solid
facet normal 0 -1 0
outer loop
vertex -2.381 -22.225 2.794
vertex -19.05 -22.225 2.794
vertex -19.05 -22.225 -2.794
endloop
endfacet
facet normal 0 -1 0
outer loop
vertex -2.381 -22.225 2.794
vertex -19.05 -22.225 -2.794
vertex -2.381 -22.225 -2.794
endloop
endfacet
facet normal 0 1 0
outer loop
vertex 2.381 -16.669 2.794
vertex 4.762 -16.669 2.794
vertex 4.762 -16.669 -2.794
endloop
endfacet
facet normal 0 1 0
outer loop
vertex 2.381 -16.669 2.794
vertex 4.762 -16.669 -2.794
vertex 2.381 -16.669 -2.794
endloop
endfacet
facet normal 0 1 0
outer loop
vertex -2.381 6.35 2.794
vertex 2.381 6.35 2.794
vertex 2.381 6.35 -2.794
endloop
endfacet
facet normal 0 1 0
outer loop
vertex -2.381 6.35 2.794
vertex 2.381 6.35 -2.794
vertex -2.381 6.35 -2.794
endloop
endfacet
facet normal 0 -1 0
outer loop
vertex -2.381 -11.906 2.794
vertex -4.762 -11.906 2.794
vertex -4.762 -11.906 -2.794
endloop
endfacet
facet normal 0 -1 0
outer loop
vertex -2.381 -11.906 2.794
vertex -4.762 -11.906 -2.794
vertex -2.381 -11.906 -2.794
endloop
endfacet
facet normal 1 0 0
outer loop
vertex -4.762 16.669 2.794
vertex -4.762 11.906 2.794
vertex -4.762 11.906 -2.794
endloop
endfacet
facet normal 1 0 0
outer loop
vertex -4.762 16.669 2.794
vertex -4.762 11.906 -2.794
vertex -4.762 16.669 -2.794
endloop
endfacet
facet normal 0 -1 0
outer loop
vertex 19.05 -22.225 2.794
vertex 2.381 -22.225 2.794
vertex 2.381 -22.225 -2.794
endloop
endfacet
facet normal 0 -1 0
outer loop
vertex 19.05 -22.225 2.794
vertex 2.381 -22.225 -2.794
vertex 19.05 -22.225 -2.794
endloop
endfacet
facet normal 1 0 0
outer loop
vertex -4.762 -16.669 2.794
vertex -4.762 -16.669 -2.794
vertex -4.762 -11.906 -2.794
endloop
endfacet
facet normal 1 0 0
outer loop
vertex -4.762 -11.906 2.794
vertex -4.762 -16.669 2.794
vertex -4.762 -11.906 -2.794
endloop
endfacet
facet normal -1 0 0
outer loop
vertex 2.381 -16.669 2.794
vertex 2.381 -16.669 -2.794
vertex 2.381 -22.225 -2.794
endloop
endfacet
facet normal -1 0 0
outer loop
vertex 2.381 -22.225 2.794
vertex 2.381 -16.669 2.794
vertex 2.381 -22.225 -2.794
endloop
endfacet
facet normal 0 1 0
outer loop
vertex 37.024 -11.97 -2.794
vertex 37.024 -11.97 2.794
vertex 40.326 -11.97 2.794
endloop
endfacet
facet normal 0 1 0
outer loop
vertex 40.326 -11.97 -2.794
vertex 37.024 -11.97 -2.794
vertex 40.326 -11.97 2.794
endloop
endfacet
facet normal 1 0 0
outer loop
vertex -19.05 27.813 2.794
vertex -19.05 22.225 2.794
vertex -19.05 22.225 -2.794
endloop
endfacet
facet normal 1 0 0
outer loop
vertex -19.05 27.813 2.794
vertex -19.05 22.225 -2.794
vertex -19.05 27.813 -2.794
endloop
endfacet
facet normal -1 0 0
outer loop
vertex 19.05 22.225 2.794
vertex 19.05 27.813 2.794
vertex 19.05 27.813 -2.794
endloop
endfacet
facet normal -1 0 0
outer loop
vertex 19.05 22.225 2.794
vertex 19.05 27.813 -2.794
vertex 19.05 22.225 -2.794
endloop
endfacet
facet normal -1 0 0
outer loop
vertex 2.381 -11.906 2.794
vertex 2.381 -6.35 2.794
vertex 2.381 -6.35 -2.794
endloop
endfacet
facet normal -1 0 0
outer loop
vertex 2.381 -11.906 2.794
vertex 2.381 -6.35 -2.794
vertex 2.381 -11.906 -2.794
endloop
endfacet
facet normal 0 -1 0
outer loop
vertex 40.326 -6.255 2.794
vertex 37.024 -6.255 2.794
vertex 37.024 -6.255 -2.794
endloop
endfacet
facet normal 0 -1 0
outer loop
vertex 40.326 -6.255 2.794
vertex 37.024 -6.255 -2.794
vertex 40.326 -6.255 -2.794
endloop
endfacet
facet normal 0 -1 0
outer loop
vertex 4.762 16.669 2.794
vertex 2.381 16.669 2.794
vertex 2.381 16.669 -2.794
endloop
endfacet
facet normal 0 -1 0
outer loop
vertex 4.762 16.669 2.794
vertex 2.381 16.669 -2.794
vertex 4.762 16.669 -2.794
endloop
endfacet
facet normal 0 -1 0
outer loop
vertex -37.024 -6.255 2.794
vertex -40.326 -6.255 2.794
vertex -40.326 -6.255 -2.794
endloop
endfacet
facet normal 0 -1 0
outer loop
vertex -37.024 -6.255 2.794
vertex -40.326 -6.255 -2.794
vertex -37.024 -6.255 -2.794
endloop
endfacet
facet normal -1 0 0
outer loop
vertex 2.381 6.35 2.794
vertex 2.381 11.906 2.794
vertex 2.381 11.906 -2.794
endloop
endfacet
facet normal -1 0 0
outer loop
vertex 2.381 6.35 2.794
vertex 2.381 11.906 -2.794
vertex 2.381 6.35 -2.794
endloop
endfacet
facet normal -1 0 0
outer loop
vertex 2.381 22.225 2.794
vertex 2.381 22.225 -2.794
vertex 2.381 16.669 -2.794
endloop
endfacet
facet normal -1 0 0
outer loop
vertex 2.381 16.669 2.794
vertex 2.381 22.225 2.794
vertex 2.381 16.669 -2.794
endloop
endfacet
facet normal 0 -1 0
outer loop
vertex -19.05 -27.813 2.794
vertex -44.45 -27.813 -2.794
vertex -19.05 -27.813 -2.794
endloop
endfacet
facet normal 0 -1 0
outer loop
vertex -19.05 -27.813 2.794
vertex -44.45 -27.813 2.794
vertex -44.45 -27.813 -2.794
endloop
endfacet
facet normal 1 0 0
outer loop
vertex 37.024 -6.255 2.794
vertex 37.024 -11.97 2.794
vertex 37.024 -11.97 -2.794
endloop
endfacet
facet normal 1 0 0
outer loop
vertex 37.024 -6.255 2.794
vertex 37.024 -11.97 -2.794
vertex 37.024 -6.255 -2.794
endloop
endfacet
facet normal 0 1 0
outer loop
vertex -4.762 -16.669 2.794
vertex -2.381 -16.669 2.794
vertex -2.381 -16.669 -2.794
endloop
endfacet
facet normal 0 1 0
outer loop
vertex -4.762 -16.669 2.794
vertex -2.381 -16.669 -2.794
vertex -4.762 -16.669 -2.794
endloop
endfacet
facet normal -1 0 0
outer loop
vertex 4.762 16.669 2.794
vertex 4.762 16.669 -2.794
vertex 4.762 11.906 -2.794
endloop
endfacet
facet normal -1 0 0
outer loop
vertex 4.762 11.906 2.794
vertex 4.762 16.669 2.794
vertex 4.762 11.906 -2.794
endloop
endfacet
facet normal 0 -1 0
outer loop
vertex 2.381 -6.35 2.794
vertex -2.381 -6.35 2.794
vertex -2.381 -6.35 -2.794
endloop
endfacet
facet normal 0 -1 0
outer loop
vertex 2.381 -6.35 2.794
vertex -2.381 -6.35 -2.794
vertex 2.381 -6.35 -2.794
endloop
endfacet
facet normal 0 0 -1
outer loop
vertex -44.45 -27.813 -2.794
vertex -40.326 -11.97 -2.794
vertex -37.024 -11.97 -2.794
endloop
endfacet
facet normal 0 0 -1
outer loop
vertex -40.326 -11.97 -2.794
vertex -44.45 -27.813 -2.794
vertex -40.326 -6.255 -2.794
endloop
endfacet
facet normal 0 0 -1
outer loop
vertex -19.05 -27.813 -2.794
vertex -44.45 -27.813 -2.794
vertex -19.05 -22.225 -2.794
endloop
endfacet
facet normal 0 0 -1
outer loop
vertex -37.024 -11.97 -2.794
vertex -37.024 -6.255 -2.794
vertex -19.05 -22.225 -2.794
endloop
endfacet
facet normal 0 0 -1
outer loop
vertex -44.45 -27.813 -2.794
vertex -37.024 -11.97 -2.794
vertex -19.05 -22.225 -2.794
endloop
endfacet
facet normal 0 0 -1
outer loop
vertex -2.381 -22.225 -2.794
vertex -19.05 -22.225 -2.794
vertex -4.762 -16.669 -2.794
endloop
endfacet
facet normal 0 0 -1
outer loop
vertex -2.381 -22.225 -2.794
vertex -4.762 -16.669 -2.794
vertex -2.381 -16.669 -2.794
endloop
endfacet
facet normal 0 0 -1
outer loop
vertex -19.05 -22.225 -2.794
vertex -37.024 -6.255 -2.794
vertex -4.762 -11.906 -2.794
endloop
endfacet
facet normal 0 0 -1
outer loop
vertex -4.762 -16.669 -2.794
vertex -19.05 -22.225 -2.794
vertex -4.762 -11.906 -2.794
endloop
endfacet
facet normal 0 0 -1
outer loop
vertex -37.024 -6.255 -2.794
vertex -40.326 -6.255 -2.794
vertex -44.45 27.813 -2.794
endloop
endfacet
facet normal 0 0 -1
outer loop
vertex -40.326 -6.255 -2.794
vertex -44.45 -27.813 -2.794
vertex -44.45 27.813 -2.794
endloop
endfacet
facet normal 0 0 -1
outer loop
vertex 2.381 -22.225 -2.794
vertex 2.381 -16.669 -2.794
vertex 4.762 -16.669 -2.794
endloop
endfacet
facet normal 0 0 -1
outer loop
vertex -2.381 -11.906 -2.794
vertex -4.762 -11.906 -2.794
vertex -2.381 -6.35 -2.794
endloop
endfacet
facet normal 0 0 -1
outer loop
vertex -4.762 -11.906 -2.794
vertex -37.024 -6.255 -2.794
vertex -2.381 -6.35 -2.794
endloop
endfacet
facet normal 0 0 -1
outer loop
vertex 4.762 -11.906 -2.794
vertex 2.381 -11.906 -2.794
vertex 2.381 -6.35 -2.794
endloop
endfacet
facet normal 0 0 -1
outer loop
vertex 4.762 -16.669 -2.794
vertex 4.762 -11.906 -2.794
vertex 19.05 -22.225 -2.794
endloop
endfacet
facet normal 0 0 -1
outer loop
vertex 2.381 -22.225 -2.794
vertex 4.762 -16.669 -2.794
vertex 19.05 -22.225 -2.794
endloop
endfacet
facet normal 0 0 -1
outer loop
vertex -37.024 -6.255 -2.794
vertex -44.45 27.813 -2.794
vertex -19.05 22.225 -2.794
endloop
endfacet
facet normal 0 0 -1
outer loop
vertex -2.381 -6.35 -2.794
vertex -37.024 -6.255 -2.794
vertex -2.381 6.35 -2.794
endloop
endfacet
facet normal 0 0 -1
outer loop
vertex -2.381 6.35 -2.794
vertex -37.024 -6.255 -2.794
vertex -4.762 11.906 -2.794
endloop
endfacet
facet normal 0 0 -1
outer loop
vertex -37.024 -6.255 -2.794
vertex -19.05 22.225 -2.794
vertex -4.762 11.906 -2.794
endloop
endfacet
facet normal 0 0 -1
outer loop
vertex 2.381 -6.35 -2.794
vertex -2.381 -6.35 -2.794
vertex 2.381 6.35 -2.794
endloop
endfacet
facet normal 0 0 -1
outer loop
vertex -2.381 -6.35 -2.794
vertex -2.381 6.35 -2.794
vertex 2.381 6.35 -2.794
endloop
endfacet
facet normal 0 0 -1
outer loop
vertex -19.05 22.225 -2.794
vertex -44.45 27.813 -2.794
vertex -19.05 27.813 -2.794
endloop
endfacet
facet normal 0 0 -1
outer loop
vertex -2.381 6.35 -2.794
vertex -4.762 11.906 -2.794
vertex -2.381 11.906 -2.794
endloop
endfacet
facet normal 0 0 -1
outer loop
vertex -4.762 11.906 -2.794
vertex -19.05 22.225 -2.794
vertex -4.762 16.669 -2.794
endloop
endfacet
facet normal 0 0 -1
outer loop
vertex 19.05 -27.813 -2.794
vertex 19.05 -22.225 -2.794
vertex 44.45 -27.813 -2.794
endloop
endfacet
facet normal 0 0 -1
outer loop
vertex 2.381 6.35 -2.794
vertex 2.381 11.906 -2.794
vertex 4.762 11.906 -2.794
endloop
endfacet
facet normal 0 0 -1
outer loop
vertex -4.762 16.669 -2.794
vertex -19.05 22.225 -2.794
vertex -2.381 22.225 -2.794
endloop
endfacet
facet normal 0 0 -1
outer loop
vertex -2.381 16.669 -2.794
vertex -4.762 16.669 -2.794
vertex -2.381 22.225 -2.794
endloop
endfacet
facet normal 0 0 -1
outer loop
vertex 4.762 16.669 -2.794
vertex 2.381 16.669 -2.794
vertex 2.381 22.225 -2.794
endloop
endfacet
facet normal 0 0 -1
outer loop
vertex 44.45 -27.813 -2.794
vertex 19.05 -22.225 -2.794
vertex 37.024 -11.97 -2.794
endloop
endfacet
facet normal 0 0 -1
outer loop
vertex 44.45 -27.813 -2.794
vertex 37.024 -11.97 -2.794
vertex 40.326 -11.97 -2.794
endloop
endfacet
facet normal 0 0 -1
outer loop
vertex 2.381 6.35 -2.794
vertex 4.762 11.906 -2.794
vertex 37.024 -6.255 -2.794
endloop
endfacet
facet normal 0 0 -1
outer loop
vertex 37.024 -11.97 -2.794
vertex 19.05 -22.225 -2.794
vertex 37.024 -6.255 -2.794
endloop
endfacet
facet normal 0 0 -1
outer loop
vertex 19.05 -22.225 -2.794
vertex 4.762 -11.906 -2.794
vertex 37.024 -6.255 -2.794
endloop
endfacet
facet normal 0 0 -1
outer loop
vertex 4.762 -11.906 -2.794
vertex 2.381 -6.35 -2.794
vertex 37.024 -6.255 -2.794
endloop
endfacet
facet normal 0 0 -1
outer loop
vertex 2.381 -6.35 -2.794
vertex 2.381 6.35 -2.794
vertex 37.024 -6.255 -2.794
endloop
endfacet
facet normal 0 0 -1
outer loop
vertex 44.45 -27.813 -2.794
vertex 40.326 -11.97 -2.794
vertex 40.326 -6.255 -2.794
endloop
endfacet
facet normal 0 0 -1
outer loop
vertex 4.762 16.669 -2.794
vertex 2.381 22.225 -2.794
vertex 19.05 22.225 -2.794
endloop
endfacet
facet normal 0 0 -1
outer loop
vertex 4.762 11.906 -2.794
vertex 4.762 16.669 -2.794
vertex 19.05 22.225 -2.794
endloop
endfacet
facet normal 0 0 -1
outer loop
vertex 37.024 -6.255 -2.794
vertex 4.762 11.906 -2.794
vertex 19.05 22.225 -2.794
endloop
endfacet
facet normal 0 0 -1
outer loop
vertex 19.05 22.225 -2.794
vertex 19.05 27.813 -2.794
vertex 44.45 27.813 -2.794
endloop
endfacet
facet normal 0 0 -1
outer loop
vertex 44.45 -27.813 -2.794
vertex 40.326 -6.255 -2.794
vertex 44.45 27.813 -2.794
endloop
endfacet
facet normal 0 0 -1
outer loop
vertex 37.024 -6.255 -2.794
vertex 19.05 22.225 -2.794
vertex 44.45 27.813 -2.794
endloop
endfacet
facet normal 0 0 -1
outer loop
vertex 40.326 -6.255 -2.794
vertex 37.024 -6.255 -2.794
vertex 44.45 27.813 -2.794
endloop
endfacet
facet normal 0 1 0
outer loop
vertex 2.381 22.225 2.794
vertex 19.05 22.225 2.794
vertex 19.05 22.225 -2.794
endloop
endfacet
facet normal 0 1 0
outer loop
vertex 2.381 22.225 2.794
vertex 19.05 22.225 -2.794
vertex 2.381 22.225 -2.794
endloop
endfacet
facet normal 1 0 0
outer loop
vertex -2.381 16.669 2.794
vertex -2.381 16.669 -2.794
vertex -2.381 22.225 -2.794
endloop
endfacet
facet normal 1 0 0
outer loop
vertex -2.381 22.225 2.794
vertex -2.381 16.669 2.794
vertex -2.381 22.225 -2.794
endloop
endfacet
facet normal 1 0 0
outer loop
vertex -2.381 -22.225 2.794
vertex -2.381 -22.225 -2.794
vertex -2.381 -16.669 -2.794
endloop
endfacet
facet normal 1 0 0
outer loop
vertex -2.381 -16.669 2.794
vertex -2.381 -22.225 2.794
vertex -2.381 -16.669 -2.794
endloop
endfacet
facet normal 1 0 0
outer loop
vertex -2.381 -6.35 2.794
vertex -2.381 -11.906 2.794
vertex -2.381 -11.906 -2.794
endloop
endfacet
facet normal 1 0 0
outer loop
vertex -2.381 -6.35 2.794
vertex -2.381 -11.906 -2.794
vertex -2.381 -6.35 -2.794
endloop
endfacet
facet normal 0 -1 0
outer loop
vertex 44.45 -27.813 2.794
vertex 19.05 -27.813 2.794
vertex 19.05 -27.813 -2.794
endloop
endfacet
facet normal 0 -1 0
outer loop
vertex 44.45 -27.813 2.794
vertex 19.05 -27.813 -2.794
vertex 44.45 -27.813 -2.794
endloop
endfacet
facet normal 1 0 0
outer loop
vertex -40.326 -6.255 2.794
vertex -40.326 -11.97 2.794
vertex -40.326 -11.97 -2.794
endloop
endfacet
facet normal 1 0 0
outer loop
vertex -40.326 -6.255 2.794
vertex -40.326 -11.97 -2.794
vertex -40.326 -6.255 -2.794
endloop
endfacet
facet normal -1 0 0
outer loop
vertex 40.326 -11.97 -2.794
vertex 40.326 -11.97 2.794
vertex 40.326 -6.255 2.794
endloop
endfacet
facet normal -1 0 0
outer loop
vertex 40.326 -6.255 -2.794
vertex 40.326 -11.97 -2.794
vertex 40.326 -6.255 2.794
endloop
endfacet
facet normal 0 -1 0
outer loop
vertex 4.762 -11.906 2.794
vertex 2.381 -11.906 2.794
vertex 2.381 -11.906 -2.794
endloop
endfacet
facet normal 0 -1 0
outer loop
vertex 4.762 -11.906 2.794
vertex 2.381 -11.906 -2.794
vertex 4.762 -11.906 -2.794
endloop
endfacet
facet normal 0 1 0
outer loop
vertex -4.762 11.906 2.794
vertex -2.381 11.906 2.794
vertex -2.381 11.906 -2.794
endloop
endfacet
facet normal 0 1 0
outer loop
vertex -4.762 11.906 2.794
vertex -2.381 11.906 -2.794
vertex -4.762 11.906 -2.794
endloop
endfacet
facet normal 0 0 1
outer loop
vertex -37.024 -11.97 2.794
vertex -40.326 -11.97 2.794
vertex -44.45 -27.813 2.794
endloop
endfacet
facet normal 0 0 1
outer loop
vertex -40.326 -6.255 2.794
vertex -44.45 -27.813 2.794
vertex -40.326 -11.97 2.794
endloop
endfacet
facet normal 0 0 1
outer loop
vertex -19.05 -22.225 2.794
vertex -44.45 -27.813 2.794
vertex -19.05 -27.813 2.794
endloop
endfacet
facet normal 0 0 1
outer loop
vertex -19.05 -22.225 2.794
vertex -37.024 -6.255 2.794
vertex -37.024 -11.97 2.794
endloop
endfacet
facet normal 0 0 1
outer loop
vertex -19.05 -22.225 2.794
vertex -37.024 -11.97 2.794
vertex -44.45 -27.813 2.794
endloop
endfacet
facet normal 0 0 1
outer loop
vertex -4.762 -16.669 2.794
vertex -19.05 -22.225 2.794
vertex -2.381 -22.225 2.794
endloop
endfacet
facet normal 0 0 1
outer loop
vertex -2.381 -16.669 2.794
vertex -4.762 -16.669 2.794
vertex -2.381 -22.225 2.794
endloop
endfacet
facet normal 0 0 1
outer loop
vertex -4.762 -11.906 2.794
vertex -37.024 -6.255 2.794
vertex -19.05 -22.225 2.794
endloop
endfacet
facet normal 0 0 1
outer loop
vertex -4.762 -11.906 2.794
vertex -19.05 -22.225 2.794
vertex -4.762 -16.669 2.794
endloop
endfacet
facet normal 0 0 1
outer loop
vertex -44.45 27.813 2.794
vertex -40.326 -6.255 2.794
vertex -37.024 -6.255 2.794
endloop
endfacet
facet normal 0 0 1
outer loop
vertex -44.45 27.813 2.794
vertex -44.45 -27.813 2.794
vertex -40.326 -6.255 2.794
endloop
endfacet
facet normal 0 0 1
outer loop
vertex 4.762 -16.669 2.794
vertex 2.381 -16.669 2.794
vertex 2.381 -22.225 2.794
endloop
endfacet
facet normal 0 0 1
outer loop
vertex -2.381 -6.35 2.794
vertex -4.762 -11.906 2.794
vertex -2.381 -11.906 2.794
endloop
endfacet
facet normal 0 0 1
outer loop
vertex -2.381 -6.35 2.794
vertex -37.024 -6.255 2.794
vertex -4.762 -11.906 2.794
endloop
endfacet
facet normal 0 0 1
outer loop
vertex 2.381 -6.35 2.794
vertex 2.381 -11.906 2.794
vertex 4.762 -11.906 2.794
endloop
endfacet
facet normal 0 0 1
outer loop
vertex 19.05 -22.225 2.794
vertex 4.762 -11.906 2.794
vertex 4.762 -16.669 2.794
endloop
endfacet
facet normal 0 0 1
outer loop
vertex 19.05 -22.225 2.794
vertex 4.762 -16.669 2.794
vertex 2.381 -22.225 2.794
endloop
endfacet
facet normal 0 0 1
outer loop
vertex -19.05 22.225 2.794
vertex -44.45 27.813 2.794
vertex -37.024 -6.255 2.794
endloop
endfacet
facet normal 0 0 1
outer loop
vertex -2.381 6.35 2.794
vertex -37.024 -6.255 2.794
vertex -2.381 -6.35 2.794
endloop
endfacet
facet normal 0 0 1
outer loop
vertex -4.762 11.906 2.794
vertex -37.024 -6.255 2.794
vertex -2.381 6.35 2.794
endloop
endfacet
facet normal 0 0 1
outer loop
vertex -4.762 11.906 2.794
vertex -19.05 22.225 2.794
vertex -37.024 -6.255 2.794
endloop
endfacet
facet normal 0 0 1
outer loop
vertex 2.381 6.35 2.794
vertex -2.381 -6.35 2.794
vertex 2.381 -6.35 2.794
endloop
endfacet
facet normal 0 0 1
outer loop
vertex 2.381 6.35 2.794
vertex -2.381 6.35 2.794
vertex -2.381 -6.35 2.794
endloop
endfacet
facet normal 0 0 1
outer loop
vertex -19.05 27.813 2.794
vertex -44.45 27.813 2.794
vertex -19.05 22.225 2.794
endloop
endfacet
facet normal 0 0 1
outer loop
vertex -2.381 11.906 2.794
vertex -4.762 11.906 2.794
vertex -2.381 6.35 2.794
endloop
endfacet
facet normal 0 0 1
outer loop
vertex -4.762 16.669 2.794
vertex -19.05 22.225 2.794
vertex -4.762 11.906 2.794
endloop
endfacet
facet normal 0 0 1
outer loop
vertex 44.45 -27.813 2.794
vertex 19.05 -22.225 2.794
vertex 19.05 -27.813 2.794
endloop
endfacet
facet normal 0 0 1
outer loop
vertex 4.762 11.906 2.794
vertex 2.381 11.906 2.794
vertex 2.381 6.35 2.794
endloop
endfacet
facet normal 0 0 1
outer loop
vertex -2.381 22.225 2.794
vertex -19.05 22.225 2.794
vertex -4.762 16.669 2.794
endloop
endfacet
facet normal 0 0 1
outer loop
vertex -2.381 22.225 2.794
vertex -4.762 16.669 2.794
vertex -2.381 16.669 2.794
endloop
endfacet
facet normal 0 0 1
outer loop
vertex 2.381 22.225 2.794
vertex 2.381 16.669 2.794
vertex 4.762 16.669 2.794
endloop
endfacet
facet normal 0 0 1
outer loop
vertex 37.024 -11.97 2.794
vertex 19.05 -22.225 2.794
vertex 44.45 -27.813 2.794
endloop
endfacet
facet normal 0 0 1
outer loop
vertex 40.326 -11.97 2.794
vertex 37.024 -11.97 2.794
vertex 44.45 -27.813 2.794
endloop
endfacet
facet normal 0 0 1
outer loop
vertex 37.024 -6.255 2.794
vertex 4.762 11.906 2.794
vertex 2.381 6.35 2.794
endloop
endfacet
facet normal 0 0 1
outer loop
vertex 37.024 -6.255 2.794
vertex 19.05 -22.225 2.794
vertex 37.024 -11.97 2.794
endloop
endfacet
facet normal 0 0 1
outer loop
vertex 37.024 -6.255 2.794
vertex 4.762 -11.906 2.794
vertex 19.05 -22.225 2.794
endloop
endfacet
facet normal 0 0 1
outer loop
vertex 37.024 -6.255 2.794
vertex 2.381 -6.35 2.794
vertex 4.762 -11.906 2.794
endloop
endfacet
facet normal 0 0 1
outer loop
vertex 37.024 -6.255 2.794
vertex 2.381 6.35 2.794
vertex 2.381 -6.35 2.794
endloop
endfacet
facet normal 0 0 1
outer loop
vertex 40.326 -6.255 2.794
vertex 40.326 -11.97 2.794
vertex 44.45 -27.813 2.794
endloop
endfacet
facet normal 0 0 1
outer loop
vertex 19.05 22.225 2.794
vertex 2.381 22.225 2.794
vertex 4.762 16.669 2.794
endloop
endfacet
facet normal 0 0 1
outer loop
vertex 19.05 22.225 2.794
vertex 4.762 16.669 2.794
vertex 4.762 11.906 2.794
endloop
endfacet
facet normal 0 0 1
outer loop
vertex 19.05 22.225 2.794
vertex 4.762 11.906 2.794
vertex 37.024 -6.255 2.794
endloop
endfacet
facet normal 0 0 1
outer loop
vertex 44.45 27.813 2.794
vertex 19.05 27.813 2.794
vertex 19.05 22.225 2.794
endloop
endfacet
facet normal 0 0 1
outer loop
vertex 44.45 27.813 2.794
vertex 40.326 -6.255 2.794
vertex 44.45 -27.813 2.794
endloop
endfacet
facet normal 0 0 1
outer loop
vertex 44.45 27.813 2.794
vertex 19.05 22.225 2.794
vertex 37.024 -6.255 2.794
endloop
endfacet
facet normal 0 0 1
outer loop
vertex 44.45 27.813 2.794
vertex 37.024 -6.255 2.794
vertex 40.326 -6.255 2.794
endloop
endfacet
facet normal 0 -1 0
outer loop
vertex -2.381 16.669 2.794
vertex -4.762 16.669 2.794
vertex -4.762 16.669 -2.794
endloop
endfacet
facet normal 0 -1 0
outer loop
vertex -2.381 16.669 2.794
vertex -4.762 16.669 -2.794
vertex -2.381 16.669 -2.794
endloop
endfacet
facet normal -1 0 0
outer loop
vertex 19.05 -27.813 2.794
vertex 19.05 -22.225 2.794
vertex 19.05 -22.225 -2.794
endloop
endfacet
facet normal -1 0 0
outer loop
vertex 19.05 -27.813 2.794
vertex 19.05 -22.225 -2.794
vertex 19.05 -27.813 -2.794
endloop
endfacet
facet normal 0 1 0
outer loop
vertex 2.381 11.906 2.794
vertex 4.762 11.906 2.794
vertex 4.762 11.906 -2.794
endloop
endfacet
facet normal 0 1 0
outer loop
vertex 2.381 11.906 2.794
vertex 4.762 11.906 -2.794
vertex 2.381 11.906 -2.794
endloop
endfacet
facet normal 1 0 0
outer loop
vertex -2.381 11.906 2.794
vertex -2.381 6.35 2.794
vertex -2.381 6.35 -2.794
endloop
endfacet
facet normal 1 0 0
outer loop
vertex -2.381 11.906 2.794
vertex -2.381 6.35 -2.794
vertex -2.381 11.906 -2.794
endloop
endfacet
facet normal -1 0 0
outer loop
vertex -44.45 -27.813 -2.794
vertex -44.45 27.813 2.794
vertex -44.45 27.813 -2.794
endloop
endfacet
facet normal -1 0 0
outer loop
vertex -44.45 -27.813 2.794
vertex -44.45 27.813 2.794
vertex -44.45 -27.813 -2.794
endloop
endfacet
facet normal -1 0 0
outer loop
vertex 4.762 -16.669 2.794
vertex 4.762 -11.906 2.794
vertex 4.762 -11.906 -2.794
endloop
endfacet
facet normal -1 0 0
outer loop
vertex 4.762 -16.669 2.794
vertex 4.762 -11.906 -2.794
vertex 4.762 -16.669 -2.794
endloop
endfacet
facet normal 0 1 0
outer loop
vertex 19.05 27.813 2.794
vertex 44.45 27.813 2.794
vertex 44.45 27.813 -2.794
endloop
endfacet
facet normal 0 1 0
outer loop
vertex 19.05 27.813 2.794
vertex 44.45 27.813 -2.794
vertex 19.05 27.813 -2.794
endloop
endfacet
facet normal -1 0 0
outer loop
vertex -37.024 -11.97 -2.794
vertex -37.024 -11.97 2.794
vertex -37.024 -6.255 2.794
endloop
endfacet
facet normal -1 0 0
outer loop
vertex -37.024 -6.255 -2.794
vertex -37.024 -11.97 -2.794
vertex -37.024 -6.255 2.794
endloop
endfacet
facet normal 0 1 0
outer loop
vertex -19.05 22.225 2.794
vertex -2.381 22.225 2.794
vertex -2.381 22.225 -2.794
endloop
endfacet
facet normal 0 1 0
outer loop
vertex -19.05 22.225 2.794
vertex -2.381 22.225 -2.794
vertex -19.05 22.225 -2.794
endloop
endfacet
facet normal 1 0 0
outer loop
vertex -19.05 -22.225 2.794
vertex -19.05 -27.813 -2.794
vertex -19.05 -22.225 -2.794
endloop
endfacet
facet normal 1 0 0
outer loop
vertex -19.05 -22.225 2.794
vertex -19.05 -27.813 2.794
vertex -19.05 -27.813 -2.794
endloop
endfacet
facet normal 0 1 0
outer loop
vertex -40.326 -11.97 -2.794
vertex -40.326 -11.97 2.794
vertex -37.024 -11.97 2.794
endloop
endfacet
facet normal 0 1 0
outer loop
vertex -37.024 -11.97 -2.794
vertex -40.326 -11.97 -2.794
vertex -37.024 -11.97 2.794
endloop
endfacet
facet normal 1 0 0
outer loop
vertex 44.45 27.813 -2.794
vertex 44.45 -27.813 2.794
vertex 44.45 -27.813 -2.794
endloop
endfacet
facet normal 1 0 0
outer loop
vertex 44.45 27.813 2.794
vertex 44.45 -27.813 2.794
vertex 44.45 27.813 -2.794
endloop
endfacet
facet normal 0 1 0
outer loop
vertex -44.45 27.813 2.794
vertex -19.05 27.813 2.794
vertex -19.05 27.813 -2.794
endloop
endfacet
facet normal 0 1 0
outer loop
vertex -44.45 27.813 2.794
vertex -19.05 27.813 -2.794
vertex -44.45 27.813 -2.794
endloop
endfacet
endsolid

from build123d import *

# Parameters (mm, degrees)
BOSS_EXTRUDE1_DEPTH = 2.794
SKETCH2_W           = 3.302
SKETCH2_H           = 5.715
CUT_EXTRUDE1_DEPTH  = 53.731311505


with BuildPart() as part:
    # Sketch1 → Boss-Extrude1 (new, symmetric)
    with BuildSketch(Plane.XY):
        Polygon((-19.05, -27.813), (-19.05, -22.225), (-2.38125, -22.225), (-2.38125, -16.66875), (-4.7625, -16.66875), (-4.7625, -11.90625), (-2.38125, -11.90625), (-2.38125, -6.35), (2.38125, -6.35), (2.38125, -11.90625), (4.7625, -11.90625), (4.7625, -16.66875), (2.38125, -16.66875), (2.38125, -22.225), (19.05, -22.225), (19.05, -27.813), (44.45, -27.813), (44.45, -22.225), (44.45, 22.225), (44.45, 27.813), (19.05, 27.813), (19.05, 22.225), (2.38125, 22.225), (2.38125, 16.66875), (4.7625, 16.66875), (4.7625, 11.90625), (2.38125, 11.90625), (2.38125, 6.35), (-2.38125, 6.35), (-2.38125, 11.90625), (-4.7625, 11.90625), (-4.7625, 16.66875), (-2.38125, 16.66875), (-2.38125, 22.225), (-19.05, 22.225), (-19.05, 27.813), (-44.45, 27.813), (-44.45, 22.225), (-44.45, -22.225), (-44.45, -27.813), align=None)
    extrude(amount=BOSS_EXTRUDE1_DEPTH, both=True)

    # Sketch2 → Cut-Extrude1 (cut, through all)
    with BuildSketch(Plane.XY.offset(2.794)):
        with Locations((-38.675056, -9.11225)):
            Rectangle(SKETCH2_W, SKETCH2_H)
        with Locations((38.675056, -9.11225)):
            Rectangle(SKETCH2_W, SKETCH2_H)
    extrude(amount=-CUT_EXTRUDE1_DEPTH, mode=Mode.SUBTRACT)


solid = part.part
